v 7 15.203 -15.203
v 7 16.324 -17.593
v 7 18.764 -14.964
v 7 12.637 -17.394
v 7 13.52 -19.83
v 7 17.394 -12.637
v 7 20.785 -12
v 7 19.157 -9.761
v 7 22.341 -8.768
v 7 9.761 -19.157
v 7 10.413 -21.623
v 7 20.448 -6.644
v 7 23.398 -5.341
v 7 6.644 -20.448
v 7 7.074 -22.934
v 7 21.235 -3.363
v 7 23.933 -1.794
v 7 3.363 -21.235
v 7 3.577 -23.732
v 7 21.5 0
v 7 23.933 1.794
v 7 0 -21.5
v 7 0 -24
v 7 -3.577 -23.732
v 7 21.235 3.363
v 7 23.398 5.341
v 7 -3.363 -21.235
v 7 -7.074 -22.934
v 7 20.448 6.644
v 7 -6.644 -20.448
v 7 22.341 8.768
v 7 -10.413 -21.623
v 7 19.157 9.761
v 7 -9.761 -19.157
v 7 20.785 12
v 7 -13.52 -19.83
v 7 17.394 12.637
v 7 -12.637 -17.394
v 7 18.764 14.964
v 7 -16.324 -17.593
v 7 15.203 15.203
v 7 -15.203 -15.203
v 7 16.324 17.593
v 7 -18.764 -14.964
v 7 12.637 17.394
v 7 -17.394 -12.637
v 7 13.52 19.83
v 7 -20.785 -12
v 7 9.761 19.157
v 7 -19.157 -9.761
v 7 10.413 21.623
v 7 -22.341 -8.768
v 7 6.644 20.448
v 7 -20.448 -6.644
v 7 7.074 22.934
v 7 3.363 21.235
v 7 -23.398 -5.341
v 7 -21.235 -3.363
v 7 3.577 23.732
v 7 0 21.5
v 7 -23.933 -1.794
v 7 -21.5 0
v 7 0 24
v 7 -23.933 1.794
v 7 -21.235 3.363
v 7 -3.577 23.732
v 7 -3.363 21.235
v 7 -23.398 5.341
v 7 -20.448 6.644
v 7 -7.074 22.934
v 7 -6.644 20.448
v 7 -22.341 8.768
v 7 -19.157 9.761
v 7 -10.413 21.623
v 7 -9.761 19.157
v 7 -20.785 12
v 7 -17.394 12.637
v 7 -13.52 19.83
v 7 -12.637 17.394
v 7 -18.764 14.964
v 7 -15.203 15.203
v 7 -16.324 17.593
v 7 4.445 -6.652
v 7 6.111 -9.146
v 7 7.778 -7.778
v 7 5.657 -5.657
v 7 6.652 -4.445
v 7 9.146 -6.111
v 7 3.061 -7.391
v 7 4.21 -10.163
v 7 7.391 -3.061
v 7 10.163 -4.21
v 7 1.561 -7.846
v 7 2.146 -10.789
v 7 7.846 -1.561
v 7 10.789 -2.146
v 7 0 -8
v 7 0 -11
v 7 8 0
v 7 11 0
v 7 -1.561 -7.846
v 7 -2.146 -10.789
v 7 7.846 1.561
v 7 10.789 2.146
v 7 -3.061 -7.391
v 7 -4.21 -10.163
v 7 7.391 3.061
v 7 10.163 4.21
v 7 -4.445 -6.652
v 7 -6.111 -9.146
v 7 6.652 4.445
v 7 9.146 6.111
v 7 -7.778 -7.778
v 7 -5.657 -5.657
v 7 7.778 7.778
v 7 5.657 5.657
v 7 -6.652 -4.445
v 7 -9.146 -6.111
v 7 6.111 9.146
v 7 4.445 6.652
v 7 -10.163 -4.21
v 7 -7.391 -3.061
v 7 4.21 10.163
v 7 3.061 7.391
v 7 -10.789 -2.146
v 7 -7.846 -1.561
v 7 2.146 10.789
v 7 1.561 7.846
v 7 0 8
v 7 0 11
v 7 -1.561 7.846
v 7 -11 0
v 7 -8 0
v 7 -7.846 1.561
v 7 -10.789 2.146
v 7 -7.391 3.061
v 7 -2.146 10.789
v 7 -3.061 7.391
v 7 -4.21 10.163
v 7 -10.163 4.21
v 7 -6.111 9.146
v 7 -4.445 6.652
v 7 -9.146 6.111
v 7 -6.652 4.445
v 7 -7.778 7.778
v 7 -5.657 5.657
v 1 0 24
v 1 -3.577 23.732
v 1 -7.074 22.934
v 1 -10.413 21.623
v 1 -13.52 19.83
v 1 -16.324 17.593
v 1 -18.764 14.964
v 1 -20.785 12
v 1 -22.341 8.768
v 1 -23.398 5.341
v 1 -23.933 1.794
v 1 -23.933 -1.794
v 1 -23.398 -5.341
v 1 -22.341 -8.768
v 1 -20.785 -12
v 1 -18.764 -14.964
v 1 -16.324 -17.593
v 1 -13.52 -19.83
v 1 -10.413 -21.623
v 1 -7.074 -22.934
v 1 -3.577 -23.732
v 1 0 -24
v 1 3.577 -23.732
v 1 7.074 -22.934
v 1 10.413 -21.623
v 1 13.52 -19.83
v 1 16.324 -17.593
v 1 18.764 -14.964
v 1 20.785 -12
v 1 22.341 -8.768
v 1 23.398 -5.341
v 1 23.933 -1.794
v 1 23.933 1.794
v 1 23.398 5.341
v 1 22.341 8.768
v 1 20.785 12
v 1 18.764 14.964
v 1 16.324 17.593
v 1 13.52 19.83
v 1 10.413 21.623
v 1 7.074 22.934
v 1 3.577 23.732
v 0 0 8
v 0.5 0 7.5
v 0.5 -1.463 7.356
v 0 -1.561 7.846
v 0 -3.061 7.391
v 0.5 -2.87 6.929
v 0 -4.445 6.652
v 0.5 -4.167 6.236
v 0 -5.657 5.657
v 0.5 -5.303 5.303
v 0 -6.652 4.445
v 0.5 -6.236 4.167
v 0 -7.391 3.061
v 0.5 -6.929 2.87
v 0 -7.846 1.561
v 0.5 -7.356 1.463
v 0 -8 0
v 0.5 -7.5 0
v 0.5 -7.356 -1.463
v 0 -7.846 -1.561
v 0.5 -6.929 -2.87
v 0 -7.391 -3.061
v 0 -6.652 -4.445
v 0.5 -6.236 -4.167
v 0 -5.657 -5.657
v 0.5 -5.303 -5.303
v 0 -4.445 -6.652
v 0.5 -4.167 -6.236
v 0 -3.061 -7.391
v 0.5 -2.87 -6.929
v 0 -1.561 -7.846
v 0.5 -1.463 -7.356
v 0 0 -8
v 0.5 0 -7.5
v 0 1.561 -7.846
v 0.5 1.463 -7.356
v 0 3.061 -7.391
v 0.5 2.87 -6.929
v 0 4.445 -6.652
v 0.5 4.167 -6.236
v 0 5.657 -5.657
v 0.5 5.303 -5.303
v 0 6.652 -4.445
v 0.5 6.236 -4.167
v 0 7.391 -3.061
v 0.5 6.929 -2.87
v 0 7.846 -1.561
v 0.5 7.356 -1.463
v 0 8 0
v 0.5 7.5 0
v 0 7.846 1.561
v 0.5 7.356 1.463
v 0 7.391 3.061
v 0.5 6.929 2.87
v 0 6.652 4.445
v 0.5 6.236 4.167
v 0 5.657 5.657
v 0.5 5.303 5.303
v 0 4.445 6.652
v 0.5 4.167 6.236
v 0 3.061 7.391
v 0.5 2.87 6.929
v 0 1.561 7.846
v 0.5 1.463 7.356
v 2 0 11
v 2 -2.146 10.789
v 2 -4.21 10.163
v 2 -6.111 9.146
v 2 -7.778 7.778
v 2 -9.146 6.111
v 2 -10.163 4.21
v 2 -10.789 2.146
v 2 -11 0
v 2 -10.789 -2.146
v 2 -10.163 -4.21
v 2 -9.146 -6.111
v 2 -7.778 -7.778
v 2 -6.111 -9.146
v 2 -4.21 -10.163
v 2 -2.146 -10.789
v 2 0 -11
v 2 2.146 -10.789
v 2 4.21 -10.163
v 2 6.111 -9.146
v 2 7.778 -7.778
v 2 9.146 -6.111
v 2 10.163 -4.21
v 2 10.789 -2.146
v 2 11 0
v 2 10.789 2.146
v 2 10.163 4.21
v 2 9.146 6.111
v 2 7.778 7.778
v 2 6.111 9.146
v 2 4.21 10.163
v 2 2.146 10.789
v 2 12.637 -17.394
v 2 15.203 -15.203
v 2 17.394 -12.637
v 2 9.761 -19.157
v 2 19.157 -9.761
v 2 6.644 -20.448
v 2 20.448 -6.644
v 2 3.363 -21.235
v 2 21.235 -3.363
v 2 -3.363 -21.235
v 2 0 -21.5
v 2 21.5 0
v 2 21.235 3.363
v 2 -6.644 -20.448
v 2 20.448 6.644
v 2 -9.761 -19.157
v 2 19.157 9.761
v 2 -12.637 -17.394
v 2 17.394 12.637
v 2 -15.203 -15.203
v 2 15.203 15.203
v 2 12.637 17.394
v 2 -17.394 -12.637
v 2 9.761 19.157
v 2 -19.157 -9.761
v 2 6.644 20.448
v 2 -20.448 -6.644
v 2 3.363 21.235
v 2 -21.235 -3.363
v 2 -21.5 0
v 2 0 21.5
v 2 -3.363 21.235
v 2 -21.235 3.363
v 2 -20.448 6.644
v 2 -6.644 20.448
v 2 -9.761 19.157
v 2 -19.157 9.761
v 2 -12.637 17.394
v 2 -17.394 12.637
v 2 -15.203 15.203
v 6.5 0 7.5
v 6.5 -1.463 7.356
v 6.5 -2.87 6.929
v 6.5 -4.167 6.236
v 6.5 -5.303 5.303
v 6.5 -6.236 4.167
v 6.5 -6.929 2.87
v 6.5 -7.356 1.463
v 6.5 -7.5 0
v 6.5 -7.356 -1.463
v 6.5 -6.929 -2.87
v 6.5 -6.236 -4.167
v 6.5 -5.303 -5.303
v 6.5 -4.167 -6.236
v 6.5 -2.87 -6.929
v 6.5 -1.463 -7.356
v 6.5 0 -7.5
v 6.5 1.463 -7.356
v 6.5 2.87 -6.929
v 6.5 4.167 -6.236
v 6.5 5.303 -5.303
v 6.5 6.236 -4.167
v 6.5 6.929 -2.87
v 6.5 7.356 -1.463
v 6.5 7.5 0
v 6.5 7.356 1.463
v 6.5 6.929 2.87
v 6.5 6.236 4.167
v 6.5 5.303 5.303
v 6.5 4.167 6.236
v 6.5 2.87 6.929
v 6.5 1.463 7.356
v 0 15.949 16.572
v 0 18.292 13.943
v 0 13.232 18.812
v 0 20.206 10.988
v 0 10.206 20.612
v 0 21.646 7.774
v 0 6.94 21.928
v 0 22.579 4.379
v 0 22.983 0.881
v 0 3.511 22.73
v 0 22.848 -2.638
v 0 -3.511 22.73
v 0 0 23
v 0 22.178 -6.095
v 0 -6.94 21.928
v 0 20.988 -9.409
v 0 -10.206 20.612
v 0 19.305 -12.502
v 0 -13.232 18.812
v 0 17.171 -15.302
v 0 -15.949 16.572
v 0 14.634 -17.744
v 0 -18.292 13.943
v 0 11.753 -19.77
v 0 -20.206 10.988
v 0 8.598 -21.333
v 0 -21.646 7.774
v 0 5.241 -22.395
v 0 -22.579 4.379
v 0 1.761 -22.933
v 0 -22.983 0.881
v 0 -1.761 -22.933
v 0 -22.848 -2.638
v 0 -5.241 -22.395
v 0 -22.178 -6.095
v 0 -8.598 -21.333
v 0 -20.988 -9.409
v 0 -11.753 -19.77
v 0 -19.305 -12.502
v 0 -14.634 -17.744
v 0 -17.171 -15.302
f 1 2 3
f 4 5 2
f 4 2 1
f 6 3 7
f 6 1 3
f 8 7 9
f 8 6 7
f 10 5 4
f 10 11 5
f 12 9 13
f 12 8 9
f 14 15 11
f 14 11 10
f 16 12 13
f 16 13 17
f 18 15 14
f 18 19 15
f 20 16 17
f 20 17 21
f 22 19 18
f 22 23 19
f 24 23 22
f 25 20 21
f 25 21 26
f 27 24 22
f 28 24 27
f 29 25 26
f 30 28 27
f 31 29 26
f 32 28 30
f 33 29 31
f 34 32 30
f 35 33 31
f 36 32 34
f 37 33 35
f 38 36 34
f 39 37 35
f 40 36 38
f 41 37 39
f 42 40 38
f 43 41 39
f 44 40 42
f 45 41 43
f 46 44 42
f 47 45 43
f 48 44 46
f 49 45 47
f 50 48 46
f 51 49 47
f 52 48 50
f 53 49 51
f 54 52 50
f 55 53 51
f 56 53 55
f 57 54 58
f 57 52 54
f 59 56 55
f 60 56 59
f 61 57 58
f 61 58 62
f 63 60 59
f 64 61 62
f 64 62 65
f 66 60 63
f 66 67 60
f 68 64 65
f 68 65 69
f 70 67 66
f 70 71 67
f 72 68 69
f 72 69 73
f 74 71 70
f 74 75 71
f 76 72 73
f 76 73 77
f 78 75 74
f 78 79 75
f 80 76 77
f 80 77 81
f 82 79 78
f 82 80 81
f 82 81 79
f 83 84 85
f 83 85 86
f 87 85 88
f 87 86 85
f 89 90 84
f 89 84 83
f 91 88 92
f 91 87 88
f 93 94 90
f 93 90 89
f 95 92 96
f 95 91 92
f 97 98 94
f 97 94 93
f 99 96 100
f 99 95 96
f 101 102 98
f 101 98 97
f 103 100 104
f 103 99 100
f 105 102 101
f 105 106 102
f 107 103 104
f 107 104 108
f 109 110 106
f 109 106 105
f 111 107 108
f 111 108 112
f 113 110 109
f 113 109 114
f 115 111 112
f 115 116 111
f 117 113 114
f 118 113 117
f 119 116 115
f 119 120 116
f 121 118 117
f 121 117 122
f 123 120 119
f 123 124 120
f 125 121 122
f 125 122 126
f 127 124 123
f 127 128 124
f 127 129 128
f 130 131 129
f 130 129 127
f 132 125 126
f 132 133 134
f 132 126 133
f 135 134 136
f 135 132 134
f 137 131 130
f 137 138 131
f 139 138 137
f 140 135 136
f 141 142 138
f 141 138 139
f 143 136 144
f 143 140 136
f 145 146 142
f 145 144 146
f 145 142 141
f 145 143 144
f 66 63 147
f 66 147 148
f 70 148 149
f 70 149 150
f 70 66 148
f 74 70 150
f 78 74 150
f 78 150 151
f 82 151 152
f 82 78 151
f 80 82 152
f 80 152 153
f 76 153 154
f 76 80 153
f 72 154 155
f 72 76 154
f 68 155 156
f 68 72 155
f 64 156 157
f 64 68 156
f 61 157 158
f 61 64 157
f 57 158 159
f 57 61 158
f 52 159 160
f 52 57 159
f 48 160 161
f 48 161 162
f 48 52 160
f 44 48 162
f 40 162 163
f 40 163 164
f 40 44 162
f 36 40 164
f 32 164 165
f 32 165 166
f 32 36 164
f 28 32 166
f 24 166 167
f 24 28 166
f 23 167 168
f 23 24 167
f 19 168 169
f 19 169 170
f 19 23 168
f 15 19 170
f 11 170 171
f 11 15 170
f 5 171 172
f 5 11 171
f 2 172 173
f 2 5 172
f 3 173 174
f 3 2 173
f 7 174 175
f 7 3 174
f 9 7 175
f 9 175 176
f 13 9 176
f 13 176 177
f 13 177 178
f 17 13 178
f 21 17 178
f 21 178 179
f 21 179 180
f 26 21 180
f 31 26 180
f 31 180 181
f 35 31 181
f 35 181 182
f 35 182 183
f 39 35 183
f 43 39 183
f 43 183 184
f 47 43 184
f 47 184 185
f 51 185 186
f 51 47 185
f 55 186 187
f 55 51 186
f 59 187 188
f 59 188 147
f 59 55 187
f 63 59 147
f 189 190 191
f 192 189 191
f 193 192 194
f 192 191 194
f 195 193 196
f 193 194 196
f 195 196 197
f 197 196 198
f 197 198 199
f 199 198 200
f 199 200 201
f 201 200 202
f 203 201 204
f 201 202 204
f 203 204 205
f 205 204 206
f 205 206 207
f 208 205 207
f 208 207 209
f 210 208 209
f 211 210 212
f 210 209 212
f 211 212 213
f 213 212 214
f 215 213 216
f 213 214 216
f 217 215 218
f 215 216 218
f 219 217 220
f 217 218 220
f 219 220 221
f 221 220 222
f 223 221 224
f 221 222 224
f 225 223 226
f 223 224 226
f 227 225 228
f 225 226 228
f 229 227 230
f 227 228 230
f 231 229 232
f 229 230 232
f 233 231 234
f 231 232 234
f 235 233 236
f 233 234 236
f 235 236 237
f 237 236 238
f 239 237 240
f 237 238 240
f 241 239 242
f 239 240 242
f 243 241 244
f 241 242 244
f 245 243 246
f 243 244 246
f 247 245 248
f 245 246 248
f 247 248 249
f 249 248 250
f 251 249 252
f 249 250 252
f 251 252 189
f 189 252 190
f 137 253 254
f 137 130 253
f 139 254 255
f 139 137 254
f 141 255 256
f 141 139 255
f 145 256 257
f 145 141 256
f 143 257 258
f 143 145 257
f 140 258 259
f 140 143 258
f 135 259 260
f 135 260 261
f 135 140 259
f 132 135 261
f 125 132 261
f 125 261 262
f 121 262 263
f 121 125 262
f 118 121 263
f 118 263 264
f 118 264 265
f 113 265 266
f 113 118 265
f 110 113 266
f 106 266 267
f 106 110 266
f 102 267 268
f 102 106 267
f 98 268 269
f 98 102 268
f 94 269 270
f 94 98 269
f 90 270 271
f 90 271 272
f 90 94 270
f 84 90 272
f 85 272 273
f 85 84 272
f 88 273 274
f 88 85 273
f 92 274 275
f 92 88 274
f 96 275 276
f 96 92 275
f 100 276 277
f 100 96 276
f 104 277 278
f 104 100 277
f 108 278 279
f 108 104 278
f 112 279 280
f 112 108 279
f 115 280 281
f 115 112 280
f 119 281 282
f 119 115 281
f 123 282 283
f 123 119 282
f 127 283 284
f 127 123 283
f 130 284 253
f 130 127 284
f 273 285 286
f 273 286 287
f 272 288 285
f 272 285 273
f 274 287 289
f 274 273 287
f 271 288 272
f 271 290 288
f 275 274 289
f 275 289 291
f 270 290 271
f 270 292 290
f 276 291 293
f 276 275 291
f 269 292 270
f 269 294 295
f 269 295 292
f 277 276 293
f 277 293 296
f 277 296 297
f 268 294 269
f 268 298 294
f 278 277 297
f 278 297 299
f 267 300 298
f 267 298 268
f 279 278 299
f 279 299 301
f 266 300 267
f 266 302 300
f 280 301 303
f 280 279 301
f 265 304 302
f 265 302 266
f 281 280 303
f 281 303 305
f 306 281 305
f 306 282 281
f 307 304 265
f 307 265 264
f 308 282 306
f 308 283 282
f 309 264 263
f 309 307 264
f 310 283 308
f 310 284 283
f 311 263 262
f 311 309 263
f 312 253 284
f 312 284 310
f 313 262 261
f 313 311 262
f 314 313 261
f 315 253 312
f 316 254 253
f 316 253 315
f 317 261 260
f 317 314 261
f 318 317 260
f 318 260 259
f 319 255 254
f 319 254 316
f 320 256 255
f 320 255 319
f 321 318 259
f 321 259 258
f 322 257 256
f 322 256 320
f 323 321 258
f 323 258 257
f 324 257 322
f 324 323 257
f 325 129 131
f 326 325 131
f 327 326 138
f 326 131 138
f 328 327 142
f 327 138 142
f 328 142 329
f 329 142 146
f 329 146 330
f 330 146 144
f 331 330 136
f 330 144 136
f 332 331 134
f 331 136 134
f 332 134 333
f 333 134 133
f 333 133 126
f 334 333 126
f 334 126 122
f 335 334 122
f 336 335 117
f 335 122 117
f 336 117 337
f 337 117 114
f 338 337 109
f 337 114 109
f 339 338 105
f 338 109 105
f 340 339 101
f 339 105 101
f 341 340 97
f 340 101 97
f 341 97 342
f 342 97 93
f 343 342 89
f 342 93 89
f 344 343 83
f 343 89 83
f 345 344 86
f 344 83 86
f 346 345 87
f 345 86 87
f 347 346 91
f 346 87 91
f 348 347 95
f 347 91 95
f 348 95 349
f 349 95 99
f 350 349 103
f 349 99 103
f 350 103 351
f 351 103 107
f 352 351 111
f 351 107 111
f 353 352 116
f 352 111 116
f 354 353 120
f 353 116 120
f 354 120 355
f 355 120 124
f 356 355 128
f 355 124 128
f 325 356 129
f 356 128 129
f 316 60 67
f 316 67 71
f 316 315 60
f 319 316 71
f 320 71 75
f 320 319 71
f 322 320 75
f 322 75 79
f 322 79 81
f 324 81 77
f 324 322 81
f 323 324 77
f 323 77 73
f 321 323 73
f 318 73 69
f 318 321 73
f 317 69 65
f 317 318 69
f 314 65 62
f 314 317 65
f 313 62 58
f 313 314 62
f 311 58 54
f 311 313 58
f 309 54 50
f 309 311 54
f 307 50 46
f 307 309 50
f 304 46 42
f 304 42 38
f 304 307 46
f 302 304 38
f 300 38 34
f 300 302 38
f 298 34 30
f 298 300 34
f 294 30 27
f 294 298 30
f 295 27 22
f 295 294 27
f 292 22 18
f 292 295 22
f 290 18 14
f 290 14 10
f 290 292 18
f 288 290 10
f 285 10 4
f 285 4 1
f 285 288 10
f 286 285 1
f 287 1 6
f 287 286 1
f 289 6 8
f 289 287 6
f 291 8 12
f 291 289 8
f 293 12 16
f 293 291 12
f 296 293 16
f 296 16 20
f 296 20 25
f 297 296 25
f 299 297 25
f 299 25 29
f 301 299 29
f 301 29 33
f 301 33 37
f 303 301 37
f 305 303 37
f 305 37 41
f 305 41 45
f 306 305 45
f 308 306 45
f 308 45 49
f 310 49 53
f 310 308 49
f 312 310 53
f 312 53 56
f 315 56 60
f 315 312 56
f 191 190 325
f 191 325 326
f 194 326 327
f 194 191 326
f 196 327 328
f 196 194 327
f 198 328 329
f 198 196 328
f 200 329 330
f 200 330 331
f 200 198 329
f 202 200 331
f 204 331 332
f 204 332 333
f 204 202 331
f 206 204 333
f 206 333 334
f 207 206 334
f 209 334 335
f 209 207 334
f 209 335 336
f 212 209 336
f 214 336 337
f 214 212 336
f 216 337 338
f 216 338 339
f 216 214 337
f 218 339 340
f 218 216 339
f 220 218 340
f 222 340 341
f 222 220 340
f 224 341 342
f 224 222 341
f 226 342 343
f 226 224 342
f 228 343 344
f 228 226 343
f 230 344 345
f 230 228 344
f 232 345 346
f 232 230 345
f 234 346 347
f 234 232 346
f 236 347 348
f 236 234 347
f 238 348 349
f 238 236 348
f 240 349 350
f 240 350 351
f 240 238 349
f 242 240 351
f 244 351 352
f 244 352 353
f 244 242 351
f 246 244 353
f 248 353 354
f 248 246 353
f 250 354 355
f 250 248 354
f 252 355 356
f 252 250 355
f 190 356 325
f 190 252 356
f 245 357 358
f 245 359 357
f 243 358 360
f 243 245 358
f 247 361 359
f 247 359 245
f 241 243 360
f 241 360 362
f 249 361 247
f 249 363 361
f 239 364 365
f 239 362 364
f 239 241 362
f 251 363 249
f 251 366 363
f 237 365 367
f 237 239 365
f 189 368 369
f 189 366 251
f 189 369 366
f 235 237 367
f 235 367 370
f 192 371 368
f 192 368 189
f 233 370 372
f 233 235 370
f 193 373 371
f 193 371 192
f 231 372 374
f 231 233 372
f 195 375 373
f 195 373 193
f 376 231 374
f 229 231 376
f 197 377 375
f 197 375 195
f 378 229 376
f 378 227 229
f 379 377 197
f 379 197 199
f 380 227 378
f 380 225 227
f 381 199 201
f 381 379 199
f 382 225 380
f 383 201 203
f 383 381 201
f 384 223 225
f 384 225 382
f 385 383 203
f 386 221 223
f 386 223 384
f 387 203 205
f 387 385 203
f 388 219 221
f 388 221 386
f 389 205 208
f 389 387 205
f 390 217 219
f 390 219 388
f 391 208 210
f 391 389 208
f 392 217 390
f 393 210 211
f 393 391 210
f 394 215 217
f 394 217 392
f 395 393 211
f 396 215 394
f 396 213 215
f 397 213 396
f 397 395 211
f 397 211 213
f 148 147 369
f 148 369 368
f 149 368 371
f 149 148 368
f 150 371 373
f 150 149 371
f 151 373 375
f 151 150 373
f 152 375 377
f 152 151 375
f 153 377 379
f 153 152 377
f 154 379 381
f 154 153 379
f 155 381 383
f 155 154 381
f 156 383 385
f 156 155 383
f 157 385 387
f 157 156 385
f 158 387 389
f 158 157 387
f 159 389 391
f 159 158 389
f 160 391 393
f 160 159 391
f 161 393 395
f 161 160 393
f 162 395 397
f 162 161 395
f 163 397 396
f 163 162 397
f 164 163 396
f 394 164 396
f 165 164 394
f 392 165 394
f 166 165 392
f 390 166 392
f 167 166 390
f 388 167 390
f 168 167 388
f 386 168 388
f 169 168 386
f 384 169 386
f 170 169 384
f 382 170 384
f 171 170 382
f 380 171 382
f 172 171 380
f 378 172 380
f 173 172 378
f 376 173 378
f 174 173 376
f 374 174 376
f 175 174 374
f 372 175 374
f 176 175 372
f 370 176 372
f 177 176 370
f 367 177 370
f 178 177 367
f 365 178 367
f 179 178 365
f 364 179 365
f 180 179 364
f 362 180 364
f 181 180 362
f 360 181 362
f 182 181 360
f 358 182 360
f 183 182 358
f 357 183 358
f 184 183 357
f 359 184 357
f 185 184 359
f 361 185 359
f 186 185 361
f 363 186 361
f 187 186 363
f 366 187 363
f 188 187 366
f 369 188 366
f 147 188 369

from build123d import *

# Parameters (mm, degrees)
CHAMFER_1_SIZE = 1
CHAMFER_2_SIZE = 0.5


with BuildPart() as part:
    # Эскиз1 → Повернуть1 (revolve)
    with BuildSketch(Plane.XY, mode=Mode.PRIVATE) as revolve_1_sk:
        Polygon((7, 21.5), (2, 21.5), (2, 11), (7, 11), (7, 7.5), (0, 7.5), (0, 24), (7, 24), align=None)
    revolve(revolve_1_sk.sketch.rotate(Axis((0, 0, 0), (1, 0, 0)), 90), axis=Axis((0, 0, 0), (1, 0, 0)))

    # Фаска1
    chamfer_1_edges = [part.edges().sort_by_distance(p)[0] for p in [
        (0, 0, -24),
    ]]
    chamfer(chamfer_1_edges, length=CHAMFER_1_SIZE)

    # Фаска2
    chamfer_2_edges = [part.edges().sort_by_distance(p)[0] for p in [
        (7, 0, -7.5),
        (0, 0, -7.5),
    ]]
    chamfer(chamfer_2_edges, length=CHAMFER_2_SIZE)


solid = part.part
